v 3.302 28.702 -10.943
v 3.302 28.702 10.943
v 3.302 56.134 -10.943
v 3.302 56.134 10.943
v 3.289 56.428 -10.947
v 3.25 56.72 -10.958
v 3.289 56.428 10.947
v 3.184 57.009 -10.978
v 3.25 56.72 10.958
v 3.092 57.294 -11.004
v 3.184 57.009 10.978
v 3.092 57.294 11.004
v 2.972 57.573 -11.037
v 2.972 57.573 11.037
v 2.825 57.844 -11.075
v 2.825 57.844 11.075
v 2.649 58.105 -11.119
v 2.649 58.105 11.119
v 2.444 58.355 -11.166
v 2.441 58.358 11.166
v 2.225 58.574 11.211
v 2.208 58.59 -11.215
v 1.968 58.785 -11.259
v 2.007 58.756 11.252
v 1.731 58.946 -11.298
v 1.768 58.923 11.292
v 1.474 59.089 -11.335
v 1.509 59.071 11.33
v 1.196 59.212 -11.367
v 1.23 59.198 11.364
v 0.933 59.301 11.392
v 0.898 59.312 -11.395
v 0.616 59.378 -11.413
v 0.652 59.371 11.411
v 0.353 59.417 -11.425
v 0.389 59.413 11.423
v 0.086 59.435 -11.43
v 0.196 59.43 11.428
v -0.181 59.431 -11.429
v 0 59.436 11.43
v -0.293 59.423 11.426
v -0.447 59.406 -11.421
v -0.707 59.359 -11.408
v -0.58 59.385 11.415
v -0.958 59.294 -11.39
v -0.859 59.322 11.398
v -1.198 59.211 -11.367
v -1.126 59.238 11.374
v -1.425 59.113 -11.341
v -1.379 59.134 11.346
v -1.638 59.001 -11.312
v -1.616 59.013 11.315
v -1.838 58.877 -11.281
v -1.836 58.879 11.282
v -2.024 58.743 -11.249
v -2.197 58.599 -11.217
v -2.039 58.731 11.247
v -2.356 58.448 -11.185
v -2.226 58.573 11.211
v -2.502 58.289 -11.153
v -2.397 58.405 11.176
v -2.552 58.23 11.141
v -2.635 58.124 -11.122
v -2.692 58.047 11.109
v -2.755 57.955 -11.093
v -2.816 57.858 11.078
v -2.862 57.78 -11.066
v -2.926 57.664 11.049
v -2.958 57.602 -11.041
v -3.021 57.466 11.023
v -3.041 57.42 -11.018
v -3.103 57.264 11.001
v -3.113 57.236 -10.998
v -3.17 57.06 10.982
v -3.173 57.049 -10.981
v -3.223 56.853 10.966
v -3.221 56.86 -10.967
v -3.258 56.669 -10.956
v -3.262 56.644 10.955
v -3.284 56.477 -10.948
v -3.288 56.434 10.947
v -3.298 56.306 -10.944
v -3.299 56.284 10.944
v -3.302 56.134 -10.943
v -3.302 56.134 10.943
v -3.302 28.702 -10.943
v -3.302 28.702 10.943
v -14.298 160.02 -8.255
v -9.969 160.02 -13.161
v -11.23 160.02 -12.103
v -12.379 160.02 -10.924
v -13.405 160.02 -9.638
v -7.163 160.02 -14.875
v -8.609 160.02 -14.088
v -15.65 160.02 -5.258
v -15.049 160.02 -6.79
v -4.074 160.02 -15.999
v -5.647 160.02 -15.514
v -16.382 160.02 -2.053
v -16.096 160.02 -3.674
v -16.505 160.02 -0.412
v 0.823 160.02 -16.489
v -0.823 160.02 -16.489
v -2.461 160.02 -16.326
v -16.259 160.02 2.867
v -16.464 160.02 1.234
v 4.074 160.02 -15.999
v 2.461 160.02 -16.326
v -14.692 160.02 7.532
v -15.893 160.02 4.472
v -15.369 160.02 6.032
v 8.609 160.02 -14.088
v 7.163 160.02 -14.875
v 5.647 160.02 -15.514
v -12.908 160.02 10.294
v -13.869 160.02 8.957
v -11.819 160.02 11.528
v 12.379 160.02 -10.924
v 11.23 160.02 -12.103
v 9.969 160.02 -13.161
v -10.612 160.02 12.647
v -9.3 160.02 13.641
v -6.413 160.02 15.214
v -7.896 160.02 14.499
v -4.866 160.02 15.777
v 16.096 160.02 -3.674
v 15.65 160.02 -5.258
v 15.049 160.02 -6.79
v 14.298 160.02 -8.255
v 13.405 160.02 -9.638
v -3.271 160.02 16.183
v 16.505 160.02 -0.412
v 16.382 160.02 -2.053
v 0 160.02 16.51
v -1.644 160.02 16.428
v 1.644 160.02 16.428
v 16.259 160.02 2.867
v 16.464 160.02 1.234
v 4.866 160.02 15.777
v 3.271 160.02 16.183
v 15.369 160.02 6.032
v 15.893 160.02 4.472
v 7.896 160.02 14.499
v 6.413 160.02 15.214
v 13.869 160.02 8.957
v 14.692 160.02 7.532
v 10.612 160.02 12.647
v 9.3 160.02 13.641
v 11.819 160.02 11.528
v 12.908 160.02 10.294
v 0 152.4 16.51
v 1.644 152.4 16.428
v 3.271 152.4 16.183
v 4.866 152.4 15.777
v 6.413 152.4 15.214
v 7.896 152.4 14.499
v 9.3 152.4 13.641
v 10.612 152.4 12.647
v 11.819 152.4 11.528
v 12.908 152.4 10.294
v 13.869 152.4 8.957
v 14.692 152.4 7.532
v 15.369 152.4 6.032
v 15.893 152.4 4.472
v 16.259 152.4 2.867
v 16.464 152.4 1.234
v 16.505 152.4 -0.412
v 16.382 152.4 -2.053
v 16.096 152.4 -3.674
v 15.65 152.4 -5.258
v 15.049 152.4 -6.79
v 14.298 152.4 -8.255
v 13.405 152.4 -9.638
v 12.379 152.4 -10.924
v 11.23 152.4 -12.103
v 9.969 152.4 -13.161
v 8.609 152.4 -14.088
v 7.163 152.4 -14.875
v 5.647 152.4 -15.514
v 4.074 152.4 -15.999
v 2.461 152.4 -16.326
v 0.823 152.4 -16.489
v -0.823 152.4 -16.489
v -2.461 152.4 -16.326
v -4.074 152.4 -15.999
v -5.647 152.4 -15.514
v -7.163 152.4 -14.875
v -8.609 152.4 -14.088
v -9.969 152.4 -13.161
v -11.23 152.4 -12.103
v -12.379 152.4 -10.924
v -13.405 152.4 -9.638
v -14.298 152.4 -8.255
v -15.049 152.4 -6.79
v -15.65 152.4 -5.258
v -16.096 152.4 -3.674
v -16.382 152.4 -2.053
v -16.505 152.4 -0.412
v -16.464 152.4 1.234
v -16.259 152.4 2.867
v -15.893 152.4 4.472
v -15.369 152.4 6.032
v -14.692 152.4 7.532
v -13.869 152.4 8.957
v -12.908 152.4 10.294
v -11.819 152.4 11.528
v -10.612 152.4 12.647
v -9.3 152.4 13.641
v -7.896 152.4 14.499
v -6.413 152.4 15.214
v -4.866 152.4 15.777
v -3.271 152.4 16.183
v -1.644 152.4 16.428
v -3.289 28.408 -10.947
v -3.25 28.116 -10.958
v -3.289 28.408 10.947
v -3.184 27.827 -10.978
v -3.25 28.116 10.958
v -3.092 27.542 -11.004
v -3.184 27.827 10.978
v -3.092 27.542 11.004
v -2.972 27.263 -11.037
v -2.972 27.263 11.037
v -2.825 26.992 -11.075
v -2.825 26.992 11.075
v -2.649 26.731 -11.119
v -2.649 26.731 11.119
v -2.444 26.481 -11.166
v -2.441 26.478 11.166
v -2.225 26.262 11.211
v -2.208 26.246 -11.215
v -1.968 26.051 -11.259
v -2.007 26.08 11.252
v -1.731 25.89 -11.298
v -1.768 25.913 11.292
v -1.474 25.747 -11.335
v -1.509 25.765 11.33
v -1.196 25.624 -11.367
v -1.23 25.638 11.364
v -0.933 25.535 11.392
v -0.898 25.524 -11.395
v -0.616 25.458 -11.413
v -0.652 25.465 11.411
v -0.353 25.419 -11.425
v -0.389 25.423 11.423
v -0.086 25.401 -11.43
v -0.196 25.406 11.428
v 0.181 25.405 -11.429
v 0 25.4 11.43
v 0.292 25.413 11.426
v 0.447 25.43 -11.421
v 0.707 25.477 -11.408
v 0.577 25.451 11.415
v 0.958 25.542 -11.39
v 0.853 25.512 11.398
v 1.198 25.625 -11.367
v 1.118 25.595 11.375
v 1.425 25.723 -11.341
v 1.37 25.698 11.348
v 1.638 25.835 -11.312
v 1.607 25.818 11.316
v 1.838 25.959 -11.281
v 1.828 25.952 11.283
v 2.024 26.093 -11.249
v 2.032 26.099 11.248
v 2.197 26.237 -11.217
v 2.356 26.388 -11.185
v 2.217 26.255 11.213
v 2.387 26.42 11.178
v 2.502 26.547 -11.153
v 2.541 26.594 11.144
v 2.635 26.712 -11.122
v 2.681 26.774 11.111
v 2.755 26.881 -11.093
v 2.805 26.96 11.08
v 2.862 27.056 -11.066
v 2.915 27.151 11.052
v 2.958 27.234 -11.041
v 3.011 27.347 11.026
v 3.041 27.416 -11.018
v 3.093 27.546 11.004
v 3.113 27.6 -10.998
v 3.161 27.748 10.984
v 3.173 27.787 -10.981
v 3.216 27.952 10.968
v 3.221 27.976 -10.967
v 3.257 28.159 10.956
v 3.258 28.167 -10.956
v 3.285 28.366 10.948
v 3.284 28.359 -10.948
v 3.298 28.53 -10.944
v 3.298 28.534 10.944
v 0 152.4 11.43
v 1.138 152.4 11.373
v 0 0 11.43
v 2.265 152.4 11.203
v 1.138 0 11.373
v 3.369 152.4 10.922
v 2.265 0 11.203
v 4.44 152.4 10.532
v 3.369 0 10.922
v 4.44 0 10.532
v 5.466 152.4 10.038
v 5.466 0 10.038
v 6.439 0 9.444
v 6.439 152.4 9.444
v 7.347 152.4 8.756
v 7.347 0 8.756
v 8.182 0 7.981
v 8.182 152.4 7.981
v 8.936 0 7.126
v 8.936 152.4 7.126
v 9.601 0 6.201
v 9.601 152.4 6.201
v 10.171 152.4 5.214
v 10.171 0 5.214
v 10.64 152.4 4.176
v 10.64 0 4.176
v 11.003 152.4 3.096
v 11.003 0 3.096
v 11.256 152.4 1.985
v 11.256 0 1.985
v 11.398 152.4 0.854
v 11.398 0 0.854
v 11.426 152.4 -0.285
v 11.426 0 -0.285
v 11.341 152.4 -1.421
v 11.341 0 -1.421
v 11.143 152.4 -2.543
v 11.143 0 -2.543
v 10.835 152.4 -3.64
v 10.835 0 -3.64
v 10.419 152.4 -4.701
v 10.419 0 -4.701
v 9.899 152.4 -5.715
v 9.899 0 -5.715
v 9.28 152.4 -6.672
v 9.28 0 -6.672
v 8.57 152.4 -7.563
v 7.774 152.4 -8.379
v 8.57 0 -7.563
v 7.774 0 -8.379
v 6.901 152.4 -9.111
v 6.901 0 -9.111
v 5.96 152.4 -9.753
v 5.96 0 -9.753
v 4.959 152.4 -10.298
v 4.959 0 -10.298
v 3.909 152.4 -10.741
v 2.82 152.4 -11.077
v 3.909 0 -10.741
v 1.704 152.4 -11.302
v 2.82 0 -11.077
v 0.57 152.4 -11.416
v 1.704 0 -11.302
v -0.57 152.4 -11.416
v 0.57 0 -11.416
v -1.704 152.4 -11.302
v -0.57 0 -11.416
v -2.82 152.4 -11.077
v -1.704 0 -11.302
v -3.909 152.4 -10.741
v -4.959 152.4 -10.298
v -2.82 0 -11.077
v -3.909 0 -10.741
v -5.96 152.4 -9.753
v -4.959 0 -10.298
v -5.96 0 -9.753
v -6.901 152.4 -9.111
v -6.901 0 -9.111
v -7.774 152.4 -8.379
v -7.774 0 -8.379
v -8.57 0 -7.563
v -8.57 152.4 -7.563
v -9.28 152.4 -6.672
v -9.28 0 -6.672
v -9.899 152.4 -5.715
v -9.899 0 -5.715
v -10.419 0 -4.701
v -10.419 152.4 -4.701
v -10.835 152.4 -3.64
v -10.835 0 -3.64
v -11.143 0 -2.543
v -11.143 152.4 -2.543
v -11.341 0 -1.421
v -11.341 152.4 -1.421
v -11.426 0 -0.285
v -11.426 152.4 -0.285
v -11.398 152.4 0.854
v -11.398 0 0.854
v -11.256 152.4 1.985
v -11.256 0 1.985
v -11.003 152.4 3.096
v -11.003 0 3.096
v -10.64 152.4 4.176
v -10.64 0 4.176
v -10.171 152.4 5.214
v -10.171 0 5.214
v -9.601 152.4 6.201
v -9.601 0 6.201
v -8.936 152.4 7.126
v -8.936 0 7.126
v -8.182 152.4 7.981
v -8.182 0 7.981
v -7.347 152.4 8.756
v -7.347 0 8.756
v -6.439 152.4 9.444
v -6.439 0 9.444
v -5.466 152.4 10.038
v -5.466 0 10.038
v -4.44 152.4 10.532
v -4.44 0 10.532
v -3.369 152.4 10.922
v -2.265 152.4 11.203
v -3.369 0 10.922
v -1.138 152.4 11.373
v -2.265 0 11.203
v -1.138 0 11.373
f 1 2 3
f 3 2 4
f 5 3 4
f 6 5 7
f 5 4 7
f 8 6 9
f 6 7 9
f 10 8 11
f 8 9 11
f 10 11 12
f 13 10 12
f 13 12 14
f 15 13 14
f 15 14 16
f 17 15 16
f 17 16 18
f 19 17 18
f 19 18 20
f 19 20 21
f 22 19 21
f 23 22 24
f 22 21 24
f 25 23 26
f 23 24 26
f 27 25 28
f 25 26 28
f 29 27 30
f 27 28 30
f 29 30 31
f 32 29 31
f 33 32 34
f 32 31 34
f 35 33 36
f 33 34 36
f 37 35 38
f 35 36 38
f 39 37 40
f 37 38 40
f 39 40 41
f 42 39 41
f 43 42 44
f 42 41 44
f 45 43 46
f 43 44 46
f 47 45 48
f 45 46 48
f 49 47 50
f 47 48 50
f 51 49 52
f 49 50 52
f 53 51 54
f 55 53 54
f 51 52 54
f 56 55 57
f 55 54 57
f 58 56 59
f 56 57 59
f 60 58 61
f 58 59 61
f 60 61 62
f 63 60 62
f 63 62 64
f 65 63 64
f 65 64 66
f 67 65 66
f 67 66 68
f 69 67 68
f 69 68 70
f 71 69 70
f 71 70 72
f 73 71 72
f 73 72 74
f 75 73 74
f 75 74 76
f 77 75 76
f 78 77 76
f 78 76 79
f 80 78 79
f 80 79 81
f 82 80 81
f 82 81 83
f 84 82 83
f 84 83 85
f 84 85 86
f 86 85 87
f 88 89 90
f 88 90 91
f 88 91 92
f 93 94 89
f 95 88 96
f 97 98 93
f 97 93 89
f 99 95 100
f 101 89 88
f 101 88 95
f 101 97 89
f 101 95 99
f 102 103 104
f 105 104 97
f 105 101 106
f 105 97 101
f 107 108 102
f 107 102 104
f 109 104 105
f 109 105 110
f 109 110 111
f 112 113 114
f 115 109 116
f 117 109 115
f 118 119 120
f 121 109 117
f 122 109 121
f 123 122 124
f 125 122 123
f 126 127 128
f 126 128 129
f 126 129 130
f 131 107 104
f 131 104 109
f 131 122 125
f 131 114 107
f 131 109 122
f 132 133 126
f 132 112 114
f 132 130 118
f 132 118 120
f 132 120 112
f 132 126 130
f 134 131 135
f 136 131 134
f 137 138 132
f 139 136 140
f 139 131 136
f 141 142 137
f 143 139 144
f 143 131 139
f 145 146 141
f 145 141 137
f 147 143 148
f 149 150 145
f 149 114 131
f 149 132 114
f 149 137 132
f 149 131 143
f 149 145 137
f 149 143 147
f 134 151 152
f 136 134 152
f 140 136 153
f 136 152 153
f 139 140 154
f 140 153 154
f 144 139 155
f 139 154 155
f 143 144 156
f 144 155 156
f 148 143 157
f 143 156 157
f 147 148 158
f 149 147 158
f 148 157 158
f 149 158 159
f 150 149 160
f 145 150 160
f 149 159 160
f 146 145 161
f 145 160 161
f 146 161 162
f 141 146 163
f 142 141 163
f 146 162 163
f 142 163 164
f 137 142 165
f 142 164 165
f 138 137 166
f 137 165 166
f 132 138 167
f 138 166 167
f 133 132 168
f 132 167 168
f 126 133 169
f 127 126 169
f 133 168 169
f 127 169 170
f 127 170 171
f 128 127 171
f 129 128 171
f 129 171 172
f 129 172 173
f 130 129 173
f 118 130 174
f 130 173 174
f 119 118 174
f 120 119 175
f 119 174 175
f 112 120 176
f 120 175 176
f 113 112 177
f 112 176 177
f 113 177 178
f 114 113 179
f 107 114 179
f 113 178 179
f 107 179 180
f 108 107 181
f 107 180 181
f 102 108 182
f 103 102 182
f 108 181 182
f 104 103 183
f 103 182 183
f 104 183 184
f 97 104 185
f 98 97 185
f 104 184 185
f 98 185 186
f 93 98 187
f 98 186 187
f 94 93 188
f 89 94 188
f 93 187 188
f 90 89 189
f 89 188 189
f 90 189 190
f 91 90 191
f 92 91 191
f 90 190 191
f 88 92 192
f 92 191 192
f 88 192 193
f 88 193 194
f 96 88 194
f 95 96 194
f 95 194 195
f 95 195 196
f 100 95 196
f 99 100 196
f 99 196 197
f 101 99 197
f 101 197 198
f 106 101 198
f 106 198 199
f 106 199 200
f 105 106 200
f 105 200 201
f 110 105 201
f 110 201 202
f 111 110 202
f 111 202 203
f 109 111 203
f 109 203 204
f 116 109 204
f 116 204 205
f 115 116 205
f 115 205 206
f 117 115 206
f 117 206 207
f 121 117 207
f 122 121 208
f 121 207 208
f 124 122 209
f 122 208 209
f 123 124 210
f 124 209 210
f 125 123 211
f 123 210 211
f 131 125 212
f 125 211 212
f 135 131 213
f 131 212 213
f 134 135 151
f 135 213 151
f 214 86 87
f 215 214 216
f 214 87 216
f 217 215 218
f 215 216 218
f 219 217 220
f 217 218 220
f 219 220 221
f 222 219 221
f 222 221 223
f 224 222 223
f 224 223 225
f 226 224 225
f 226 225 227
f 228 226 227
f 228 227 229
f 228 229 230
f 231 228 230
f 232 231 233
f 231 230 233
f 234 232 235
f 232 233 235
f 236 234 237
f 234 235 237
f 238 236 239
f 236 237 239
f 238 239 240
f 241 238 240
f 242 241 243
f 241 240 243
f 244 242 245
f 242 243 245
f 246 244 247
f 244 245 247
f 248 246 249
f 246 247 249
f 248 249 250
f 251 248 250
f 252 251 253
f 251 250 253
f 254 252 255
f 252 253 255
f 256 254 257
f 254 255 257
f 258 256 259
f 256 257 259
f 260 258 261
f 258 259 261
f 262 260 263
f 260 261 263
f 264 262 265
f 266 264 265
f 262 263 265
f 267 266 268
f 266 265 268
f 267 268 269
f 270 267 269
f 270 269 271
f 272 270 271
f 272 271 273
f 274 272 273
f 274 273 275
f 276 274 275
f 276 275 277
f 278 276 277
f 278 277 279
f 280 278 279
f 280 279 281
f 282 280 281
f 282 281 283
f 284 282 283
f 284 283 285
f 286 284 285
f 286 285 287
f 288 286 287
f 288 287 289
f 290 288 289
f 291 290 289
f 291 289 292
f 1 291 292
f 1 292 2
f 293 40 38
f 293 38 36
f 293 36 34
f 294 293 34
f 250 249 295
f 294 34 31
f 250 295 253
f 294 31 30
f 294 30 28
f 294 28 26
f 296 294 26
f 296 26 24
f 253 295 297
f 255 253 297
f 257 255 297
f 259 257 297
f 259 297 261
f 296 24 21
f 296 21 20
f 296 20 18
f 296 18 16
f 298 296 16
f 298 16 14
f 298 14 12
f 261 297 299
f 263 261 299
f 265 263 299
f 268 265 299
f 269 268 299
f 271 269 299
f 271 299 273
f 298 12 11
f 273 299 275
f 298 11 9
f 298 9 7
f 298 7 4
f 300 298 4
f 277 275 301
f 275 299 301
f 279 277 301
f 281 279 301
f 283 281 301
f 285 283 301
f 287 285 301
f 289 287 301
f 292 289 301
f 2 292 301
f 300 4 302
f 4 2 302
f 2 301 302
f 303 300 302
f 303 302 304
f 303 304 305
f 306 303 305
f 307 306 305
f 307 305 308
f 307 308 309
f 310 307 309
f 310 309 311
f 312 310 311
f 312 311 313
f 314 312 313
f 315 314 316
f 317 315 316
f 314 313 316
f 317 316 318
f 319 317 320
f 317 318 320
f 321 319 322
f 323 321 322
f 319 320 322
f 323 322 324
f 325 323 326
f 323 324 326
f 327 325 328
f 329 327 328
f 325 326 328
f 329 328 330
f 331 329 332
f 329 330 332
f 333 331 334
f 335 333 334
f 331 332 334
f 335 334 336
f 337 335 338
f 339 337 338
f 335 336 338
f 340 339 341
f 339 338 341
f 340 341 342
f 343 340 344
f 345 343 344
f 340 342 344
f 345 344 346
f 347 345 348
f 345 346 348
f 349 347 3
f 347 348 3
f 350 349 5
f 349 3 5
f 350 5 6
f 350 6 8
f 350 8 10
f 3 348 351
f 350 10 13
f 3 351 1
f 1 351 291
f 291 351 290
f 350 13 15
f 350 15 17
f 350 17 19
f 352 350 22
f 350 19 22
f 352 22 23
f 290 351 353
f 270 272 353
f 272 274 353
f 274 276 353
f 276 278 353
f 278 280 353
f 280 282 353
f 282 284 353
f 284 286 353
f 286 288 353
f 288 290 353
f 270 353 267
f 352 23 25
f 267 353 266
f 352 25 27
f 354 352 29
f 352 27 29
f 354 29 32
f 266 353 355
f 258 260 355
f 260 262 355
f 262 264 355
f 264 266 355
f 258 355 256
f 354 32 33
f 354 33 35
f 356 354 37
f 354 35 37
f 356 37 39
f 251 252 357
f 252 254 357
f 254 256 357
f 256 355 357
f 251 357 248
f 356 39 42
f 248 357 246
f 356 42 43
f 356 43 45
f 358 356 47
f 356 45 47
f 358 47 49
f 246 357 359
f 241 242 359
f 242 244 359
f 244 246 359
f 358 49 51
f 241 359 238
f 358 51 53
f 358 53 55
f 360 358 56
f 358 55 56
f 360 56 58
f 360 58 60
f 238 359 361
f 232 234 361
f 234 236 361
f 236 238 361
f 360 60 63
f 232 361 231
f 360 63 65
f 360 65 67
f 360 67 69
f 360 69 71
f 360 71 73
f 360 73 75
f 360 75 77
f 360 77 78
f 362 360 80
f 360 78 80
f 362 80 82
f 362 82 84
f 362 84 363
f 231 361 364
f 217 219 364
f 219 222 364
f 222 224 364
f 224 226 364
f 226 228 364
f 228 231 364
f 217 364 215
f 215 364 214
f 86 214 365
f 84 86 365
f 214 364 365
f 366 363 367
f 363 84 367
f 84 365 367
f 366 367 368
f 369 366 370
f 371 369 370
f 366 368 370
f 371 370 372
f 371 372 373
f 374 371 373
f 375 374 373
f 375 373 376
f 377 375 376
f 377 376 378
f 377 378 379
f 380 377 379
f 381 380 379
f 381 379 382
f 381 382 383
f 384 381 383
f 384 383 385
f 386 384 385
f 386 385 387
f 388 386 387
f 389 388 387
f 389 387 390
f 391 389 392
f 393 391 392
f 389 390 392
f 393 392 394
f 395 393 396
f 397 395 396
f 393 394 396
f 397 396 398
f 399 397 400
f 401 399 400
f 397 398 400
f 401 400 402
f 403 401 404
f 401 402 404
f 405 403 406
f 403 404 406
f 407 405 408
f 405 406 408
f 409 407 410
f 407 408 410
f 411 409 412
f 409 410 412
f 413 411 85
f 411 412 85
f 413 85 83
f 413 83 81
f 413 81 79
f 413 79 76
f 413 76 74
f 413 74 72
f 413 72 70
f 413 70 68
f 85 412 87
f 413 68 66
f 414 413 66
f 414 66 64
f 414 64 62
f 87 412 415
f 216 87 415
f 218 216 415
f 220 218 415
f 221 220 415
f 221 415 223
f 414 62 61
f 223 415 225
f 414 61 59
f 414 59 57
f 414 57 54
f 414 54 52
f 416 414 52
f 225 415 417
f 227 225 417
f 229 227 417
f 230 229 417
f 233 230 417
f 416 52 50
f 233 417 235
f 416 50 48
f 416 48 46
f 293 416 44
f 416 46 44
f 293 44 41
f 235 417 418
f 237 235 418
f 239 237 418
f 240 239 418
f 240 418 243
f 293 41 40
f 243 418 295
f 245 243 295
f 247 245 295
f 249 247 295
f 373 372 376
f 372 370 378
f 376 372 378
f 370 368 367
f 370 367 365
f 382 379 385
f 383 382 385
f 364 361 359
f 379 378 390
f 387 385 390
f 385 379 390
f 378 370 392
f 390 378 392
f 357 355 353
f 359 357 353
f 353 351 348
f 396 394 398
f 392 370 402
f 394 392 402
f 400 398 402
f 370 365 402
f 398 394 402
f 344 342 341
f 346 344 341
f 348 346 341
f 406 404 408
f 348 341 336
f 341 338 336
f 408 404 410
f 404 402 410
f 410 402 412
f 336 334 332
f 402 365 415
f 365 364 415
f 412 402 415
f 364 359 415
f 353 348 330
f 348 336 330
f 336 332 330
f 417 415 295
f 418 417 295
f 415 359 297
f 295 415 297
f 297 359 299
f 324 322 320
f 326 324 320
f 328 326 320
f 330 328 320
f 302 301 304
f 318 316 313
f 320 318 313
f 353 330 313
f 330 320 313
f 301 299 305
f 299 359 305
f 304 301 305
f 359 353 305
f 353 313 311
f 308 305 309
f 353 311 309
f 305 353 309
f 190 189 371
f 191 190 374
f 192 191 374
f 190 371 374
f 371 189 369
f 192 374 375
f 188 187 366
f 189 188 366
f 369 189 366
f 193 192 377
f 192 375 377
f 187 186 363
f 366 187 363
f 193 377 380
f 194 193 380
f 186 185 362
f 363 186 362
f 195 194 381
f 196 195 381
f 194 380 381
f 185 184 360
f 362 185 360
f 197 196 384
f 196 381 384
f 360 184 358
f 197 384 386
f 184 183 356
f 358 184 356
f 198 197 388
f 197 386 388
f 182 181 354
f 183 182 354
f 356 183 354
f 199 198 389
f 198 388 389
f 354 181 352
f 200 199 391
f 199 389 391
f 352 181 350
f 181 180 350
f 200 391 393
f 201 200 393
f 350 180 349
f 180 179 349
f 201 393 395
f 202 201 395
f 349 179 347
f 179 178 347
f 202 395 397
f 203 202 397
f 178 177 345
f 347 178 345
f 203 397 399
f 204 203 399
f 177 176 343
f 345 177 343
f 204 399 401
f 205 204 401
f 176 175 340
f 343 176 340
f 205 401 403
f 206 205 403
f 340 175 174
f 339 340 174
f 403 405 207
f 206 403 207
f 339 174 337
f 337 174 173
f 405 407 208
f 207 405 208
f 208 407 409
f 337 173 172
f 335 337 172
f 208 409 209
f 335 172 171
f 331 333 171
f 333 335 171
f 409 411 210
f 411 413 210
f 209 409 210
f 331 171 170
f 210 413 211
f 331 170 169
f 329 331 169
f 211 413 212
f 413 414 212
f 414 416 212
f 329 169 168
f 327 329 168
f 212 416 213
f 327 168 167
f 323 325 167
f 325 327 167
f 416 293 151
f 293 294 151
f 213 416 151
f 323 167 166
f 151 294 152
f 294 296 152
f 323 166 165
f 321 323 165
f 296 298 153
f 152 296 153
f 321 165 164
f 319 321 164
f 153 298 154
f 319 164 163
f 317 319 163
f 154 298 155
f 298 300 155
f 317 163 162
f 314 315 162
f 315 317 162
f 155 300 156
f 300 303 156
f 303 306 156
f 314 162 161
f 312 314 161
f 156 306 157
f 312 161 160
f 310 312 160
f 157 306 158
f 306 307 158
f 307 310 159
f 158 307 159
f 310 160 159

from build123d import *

# Parameters (mm, degrees)
SKETCH1_R           = 11.43
BOSS_EXTRUDE1_DEPTH = 160.02
CUT_EXTRUDE1_DEPTH  = 73.66
BOSS_EXTRUDE2_START = -7.62
SKETCH3_R           = 16.51
SKETCH3_R_2         = 11.43
BOSS_EXTRUDE2_DEPTH = 7.62


with BuildPart() as part:
    # Sketch1 → Boss-Extrude1 (new body)
    with BuildSketch(Plane(origin=(0, 0, 0), x_dir=(1, 0, 0), z_dir=(0, 1, 0))):
        with Locations(Location((0, 0, 0), (0, 0, 270))):
            Circle(SKETCH1_R)
    extrude(amount=BOSS_EXTRUDE1_DEPTH)

    # Sketch2 → Cut-Extrude1 (cut)
    with BuildSketch(Plane.XY.offset(11.43)):
        with BuildLine():
            Line((3.301999683, 28.702000653), (3.301999683, 56.13399967))
            ThreePointArc((3.301999683, 56.13399967), (0, 59.436), (-3.302000317, 56.134000304))
            Line((-3.302000317, 56.134000304), (-3.302000317, 28.702000019))
            ThreePointArc((-3.302000317, 28.702000019), (0, 25.4), (3.301999683, 28.702000653))
        make_face()
    extrude(amount=-CUT_EXTRUDE1_DEPTH, mode=Mode.SUBTRACT)

    # Sketch3 → Boss-Extrude2 (add)
    with BuildSketch(Plane(origin=(0, 160.02, 0), x_dir=(1, 0, 0), z_dir=(0, 1, 0)).offset(BOSS_EXTRUDE2_START)):
        with Locations(Location((0, 0, 0), (0, 0, 270))):
            Circle(SKETCH3_R)
        with Locations(Location((0, 0, 0), (0, 0, 270))):
            Circle(SKETCH3_R_2, mode=Mode.SUBTRACT)
    extrude(amount=BOSS_EXTRUDE2_DEPTH)


solid = part.part
